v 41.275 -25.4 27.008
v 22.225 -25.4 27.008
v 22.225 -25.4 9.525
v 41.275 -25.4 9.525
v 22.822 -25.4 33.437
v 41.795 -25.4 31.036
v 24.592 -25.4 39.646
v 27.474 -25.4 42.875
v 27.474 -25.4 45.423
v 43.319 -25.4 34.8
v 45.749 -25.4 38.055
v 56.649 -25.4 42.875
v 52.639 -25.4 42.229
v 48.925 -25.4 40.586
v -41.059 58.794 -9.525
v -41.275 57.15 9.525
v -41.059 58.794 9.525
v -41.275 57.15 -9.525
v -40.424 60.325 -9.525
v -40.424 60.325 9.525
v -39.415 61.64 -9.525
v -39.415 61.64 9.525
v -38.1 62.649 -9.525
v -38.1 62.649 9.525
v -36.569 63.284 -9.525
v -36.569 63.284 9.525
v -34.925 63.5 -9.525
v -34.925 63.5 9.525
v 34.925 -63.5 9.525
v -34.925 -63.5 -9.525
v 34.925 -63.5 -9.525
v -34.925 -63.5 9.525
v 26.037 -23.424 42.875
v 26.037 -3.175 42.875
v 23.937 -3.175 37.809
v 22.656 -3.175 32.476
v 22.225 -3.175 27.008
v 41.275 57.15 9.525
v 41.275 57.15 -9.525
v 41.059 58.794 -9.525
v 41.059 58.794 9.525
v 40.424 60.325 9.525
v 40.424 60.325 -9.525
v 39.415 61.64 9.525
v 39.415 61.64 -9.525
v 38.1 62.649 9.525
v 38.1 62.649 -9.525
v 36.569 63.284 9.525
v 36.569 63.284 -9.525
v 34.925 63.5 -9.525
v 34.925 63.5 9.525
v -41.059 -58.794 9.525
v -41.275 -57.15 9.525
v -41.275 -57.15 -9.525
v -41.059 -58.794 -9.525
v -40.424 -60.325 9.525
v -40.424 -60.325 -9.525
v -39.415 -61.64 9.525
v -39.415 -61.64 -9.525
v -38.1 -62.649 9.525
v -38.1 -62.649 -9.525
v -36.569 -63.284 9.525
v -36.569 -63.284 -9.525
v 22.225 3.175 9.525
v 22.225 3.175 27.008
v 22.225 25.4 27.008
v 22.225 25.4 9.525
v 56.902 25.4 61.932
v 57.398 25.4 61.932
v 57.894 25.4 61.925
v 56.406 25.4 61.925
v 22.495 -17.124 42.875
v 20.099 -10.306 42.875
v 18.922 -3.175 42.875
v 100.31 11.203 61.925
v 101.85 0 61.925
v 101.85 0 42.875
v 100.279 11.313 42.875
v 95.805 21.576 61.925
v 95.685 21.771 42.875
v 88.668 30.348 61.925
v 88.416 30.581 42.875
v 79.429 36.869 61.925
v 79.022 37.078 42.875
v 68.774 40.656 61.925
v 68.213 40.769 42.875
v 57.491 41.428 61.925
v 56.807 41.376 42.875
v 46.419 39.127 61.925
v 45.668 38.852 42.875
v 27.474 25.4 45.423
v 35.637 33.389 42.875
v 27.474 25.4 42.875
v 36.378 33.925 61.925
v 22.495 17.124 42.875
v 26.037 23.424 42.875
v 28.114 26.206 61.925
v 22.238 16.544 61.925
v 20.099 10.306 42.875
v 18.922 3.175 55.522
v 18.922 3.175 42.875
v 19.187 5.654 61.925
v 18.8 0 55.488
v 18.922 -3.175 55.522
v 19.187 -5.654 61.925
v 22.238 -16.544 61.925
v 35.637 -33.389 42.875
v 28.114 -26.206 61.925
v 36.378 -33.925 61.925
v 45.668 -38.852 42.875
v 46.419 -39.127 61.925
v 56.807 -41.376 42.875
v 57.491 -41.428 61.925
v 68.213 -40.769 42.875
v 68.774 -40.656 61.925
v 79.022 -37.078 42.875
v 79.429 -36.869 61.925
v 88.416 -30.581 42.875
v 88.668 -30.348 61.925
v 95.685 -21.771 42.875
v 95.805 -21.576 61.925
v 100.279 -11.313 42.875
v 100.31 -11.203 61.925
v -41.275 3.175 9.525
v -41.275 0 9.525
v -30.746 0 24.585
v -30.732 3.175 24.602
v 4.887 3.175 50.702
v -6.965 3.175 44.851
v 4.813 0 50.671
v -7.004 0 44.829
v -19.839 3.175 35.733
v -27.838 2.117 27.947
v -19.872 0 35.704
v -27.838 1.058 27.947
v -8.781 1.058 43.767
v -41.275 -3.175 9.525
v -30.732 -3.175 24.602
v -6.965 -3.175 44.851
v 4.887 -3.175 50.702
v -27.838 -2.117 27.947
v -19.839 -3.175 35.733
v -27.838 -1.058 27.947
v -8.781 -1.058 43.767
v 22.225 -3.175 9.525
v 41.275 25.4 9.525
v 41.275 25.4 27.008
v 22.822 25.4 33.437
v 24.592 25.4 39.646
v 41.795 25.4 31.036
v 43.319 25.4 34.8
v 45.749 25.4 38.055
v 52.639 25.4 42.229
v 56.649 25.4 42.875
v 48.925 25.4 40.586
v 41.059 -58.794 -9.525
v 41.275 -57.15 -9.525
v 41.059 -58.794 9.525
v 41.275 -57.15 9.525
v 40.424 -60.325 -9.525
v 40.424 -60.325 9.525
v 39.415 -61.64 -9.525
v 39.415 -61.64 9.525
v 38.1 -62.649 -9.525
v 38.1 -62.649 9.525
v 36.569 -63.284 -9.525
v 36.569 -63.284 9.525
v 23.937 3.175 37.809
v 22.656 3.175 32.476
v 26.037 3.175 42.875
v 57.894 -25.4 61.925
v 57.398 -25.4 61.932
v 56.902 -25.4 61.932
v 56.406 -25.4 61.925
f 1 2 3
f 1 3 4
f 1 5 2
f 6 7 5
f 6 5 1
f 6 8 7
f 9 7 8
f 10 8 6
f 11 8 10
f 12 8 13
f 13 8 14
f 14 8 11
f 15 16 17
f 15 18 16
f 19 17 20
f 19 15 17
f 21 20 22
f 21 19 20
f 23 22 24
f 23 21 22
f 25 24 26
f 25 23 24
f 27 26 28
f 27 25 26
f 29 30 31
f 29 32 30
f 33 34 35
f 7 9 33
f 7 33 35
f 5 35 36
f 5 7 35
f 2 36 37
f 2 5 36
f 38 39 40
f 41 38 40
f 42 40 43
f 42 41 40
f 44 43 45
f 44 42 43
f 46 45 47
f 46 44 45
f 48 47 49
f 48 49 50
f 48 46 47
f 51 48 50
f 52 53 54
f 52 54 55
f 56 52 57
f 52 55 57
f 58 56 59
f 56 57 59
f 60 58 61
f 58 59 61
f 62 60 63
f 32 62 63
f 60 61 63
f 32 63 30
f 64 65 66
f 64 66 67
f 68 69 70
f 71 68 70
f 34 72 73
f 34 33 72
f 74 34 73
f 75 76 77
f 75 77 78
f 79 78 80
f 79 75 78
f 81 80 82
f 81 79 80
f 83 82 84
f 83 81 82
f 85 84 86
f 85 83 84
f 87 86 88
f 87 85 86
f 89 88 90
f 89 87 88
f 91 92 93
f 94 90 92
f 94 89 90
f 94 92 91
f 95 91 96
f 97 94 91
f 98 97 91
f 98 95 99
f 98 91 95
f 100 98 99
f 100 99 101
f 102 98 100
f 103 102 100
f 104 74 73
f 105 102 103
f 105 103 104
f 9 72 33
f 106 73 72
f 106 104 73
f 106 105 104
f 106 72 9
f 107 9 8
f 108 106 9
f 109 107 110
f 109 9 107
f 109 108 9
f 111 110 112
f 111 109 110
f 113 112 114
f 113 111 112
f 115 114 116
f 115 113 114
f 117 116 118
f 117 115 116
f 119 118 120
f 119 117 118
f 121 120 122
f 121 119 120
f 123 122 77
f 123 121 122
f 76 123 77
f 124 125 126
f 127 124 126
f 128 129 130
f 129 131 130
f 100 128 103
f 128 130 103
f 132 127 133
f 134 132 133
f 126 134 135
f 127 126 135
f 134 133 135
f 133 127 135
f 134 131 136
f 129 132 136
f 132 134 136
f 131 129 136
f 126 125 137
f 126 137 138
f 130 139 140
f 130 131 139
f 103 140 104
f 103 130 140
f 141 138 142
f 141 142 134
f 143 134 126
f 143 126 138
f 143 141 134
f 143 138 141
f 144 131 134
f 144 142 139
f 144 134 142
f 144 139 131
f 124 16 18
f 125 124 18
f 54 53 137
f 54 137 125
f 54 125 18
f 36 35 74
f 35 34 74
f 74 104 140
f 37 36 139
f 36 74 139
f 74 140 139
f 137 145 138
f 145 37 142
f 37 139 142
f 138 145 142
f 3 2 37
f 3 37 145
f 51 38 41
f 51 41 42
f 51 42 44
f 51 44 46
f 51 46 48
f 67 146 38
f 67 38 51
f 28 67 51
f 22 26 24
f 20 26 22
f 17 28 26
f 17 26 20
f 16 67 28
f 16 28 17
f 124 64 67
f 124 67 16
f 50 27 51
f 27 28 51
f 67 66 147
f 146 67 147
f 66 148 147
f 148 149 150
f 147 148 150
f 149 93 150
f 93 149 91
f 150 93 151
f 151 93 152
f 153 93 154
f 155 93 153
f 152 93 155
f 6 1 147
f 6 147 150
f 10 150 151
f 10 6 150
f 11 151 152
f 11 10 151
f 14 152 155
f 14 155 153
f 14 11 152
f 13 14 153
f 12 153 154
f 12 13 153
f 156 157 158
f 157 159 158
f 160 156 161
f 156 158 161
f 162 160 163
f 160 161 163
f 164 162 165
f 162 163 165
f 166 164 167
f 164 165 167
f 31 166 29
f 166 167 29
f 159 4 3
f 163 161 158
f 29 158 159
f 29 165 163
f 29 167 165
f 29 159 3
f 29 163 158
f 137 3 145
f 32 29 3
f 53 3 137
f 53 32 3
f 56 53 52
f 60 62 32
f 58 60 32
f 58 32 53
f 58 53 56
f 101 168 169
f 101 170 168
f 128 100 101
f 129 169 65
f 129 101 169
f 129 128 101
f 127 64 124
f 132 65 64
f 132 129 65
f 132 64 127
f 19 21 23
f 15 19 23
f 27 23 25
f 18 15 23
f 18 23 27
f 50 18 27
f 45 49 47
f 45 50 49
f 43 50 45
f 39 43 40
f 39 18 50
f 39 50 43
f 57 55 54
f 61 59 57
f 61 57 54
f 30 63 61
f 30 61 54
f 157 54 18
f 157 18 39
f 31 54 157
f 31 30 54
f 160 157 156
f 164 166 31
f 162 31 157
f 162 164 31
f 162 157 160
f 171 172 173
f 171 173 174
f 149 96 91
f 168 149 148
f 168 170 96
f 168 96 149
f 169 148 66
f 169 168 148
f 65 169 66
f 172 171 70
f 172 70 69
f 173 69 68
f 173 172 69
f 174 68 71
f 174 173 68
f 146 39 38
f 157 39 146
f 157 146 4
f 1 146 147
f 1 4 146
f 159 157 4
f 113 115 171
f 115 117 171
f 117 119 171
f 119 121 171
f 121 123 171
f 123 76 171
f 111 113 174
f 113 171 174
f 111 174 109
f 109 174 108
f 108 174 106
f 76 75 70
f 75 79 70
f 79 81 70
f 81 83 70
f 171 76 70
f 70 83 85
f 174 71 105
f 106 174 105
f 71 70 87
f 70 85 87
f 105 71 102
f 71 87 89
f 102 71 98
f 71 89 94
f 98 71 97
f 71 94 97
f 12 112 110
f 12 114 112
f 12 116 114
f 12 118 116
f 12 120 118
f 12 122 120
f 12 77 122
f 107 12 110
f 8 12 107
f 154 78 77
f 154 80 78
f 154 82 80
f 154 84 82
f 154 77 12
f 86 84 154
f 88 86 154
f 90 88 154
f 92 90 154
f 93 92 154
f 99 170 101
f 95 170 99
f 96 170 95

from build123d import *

# Parameters (mm, degrees)
F1_DEPTH = 63.5
F2_DEPTH = 25.4
F3_DEPTH = 3.175
F0_W     = 41.5249824387
F0_H     = 19.05
F5_R     = 6.35


with BuildPart() as f1:
    # F0 (on Front) → F1 (new body, symmetric)
    with BuildSketch(Plane.XZ):
        Polygon((-41.275, -9.525), (41.275, -9.525), (41.275, 9.525), (22.225, 9.525), (-41.275, 9.525), align=None)
    extrude(amount=F1_DEPTH, both=True)

    # F0 (on Front) → F2 (join, symmetric)
    with BuildSketch(Plane.XZ):
        with BuildLine():
            Line((22.225, 9.525), (41.275, 9.525))
            Line((41.275, 9.525), (41.275, 27.0081188058))
            ThreePointArc((41.275, 27.0081188058), (46.1033585618, 38.409317775), (57.6513575351, 42.8752))
            Line((57.6513575351, 42.8752), (60.325, 42.8752))
            Line((60.325, 42.8752), (60.325, 61.9252))
            Line((60.325, 61.9252), (57.8936839925, 61.9252))
            ThreePointArc((57.8936839925, 61.9252), (53.4742955907, 61.7391542366), (49.1138676774, 60.9960019746))
            ThreePointArc((49.1138676774, 60.9960019746), (29.7600607306, 48.6771485907), (22.225, 27.0081188058))
            Line((22.225, 27.0081188058), (22.225, 9.525))
        make_face()
    extrude(amount=F2_DEPTH, both=True)

    # F0 (on Front) → F3 (join, symmetric)
    with BuildSketch(Plane.XZ):
        with BuildLine():
            add(Edge.make_bspline(
                [(-41.275, 9.525), (-26.5586767346, 33.857088536), (-5.6087374687, 55.4516389966), (49.1138676774, 60.9960019746)],
                knots=[0, 0, 0, 0, 104.0163998813, 104.0163998813, 104.0163998813, 104.0163998813], degree=3))
            Line((-41.275, 9.525), (22.225, 9.525))
            Line((22.225, 9.525), (22.225, 27.0081188058))
            ThreePointArc((22.225, 27.0081188058), (29.7600607306, 48.6771485907), (49.1138676774, 60.9960019746))
        make_face()
    extrude(amount=F3_DEPTH, both=True)

    # F0 (on Front) → F4 (revolve)
    with BuildSketch(Plane.XZ):
        with Locations((81.0874912194, 52.4002)):
            Rectangle(F0_W, F0_H)
    revolve(axis=Axis((60.325, 0, 52.3875), (0, 0, 1)))

    # F5
    f5_edges = [f1.edges().sort_by_distance(p)[0] for p in [
        (41.275, -63.5, 0),
        (-41.275, -63.5, 0),
        (-41.275, 63.5, 0),
        (41.275, 63.5, 0),
    ]]
    fillet(f5_edges, radius=F5_R)


solid = f1.part
